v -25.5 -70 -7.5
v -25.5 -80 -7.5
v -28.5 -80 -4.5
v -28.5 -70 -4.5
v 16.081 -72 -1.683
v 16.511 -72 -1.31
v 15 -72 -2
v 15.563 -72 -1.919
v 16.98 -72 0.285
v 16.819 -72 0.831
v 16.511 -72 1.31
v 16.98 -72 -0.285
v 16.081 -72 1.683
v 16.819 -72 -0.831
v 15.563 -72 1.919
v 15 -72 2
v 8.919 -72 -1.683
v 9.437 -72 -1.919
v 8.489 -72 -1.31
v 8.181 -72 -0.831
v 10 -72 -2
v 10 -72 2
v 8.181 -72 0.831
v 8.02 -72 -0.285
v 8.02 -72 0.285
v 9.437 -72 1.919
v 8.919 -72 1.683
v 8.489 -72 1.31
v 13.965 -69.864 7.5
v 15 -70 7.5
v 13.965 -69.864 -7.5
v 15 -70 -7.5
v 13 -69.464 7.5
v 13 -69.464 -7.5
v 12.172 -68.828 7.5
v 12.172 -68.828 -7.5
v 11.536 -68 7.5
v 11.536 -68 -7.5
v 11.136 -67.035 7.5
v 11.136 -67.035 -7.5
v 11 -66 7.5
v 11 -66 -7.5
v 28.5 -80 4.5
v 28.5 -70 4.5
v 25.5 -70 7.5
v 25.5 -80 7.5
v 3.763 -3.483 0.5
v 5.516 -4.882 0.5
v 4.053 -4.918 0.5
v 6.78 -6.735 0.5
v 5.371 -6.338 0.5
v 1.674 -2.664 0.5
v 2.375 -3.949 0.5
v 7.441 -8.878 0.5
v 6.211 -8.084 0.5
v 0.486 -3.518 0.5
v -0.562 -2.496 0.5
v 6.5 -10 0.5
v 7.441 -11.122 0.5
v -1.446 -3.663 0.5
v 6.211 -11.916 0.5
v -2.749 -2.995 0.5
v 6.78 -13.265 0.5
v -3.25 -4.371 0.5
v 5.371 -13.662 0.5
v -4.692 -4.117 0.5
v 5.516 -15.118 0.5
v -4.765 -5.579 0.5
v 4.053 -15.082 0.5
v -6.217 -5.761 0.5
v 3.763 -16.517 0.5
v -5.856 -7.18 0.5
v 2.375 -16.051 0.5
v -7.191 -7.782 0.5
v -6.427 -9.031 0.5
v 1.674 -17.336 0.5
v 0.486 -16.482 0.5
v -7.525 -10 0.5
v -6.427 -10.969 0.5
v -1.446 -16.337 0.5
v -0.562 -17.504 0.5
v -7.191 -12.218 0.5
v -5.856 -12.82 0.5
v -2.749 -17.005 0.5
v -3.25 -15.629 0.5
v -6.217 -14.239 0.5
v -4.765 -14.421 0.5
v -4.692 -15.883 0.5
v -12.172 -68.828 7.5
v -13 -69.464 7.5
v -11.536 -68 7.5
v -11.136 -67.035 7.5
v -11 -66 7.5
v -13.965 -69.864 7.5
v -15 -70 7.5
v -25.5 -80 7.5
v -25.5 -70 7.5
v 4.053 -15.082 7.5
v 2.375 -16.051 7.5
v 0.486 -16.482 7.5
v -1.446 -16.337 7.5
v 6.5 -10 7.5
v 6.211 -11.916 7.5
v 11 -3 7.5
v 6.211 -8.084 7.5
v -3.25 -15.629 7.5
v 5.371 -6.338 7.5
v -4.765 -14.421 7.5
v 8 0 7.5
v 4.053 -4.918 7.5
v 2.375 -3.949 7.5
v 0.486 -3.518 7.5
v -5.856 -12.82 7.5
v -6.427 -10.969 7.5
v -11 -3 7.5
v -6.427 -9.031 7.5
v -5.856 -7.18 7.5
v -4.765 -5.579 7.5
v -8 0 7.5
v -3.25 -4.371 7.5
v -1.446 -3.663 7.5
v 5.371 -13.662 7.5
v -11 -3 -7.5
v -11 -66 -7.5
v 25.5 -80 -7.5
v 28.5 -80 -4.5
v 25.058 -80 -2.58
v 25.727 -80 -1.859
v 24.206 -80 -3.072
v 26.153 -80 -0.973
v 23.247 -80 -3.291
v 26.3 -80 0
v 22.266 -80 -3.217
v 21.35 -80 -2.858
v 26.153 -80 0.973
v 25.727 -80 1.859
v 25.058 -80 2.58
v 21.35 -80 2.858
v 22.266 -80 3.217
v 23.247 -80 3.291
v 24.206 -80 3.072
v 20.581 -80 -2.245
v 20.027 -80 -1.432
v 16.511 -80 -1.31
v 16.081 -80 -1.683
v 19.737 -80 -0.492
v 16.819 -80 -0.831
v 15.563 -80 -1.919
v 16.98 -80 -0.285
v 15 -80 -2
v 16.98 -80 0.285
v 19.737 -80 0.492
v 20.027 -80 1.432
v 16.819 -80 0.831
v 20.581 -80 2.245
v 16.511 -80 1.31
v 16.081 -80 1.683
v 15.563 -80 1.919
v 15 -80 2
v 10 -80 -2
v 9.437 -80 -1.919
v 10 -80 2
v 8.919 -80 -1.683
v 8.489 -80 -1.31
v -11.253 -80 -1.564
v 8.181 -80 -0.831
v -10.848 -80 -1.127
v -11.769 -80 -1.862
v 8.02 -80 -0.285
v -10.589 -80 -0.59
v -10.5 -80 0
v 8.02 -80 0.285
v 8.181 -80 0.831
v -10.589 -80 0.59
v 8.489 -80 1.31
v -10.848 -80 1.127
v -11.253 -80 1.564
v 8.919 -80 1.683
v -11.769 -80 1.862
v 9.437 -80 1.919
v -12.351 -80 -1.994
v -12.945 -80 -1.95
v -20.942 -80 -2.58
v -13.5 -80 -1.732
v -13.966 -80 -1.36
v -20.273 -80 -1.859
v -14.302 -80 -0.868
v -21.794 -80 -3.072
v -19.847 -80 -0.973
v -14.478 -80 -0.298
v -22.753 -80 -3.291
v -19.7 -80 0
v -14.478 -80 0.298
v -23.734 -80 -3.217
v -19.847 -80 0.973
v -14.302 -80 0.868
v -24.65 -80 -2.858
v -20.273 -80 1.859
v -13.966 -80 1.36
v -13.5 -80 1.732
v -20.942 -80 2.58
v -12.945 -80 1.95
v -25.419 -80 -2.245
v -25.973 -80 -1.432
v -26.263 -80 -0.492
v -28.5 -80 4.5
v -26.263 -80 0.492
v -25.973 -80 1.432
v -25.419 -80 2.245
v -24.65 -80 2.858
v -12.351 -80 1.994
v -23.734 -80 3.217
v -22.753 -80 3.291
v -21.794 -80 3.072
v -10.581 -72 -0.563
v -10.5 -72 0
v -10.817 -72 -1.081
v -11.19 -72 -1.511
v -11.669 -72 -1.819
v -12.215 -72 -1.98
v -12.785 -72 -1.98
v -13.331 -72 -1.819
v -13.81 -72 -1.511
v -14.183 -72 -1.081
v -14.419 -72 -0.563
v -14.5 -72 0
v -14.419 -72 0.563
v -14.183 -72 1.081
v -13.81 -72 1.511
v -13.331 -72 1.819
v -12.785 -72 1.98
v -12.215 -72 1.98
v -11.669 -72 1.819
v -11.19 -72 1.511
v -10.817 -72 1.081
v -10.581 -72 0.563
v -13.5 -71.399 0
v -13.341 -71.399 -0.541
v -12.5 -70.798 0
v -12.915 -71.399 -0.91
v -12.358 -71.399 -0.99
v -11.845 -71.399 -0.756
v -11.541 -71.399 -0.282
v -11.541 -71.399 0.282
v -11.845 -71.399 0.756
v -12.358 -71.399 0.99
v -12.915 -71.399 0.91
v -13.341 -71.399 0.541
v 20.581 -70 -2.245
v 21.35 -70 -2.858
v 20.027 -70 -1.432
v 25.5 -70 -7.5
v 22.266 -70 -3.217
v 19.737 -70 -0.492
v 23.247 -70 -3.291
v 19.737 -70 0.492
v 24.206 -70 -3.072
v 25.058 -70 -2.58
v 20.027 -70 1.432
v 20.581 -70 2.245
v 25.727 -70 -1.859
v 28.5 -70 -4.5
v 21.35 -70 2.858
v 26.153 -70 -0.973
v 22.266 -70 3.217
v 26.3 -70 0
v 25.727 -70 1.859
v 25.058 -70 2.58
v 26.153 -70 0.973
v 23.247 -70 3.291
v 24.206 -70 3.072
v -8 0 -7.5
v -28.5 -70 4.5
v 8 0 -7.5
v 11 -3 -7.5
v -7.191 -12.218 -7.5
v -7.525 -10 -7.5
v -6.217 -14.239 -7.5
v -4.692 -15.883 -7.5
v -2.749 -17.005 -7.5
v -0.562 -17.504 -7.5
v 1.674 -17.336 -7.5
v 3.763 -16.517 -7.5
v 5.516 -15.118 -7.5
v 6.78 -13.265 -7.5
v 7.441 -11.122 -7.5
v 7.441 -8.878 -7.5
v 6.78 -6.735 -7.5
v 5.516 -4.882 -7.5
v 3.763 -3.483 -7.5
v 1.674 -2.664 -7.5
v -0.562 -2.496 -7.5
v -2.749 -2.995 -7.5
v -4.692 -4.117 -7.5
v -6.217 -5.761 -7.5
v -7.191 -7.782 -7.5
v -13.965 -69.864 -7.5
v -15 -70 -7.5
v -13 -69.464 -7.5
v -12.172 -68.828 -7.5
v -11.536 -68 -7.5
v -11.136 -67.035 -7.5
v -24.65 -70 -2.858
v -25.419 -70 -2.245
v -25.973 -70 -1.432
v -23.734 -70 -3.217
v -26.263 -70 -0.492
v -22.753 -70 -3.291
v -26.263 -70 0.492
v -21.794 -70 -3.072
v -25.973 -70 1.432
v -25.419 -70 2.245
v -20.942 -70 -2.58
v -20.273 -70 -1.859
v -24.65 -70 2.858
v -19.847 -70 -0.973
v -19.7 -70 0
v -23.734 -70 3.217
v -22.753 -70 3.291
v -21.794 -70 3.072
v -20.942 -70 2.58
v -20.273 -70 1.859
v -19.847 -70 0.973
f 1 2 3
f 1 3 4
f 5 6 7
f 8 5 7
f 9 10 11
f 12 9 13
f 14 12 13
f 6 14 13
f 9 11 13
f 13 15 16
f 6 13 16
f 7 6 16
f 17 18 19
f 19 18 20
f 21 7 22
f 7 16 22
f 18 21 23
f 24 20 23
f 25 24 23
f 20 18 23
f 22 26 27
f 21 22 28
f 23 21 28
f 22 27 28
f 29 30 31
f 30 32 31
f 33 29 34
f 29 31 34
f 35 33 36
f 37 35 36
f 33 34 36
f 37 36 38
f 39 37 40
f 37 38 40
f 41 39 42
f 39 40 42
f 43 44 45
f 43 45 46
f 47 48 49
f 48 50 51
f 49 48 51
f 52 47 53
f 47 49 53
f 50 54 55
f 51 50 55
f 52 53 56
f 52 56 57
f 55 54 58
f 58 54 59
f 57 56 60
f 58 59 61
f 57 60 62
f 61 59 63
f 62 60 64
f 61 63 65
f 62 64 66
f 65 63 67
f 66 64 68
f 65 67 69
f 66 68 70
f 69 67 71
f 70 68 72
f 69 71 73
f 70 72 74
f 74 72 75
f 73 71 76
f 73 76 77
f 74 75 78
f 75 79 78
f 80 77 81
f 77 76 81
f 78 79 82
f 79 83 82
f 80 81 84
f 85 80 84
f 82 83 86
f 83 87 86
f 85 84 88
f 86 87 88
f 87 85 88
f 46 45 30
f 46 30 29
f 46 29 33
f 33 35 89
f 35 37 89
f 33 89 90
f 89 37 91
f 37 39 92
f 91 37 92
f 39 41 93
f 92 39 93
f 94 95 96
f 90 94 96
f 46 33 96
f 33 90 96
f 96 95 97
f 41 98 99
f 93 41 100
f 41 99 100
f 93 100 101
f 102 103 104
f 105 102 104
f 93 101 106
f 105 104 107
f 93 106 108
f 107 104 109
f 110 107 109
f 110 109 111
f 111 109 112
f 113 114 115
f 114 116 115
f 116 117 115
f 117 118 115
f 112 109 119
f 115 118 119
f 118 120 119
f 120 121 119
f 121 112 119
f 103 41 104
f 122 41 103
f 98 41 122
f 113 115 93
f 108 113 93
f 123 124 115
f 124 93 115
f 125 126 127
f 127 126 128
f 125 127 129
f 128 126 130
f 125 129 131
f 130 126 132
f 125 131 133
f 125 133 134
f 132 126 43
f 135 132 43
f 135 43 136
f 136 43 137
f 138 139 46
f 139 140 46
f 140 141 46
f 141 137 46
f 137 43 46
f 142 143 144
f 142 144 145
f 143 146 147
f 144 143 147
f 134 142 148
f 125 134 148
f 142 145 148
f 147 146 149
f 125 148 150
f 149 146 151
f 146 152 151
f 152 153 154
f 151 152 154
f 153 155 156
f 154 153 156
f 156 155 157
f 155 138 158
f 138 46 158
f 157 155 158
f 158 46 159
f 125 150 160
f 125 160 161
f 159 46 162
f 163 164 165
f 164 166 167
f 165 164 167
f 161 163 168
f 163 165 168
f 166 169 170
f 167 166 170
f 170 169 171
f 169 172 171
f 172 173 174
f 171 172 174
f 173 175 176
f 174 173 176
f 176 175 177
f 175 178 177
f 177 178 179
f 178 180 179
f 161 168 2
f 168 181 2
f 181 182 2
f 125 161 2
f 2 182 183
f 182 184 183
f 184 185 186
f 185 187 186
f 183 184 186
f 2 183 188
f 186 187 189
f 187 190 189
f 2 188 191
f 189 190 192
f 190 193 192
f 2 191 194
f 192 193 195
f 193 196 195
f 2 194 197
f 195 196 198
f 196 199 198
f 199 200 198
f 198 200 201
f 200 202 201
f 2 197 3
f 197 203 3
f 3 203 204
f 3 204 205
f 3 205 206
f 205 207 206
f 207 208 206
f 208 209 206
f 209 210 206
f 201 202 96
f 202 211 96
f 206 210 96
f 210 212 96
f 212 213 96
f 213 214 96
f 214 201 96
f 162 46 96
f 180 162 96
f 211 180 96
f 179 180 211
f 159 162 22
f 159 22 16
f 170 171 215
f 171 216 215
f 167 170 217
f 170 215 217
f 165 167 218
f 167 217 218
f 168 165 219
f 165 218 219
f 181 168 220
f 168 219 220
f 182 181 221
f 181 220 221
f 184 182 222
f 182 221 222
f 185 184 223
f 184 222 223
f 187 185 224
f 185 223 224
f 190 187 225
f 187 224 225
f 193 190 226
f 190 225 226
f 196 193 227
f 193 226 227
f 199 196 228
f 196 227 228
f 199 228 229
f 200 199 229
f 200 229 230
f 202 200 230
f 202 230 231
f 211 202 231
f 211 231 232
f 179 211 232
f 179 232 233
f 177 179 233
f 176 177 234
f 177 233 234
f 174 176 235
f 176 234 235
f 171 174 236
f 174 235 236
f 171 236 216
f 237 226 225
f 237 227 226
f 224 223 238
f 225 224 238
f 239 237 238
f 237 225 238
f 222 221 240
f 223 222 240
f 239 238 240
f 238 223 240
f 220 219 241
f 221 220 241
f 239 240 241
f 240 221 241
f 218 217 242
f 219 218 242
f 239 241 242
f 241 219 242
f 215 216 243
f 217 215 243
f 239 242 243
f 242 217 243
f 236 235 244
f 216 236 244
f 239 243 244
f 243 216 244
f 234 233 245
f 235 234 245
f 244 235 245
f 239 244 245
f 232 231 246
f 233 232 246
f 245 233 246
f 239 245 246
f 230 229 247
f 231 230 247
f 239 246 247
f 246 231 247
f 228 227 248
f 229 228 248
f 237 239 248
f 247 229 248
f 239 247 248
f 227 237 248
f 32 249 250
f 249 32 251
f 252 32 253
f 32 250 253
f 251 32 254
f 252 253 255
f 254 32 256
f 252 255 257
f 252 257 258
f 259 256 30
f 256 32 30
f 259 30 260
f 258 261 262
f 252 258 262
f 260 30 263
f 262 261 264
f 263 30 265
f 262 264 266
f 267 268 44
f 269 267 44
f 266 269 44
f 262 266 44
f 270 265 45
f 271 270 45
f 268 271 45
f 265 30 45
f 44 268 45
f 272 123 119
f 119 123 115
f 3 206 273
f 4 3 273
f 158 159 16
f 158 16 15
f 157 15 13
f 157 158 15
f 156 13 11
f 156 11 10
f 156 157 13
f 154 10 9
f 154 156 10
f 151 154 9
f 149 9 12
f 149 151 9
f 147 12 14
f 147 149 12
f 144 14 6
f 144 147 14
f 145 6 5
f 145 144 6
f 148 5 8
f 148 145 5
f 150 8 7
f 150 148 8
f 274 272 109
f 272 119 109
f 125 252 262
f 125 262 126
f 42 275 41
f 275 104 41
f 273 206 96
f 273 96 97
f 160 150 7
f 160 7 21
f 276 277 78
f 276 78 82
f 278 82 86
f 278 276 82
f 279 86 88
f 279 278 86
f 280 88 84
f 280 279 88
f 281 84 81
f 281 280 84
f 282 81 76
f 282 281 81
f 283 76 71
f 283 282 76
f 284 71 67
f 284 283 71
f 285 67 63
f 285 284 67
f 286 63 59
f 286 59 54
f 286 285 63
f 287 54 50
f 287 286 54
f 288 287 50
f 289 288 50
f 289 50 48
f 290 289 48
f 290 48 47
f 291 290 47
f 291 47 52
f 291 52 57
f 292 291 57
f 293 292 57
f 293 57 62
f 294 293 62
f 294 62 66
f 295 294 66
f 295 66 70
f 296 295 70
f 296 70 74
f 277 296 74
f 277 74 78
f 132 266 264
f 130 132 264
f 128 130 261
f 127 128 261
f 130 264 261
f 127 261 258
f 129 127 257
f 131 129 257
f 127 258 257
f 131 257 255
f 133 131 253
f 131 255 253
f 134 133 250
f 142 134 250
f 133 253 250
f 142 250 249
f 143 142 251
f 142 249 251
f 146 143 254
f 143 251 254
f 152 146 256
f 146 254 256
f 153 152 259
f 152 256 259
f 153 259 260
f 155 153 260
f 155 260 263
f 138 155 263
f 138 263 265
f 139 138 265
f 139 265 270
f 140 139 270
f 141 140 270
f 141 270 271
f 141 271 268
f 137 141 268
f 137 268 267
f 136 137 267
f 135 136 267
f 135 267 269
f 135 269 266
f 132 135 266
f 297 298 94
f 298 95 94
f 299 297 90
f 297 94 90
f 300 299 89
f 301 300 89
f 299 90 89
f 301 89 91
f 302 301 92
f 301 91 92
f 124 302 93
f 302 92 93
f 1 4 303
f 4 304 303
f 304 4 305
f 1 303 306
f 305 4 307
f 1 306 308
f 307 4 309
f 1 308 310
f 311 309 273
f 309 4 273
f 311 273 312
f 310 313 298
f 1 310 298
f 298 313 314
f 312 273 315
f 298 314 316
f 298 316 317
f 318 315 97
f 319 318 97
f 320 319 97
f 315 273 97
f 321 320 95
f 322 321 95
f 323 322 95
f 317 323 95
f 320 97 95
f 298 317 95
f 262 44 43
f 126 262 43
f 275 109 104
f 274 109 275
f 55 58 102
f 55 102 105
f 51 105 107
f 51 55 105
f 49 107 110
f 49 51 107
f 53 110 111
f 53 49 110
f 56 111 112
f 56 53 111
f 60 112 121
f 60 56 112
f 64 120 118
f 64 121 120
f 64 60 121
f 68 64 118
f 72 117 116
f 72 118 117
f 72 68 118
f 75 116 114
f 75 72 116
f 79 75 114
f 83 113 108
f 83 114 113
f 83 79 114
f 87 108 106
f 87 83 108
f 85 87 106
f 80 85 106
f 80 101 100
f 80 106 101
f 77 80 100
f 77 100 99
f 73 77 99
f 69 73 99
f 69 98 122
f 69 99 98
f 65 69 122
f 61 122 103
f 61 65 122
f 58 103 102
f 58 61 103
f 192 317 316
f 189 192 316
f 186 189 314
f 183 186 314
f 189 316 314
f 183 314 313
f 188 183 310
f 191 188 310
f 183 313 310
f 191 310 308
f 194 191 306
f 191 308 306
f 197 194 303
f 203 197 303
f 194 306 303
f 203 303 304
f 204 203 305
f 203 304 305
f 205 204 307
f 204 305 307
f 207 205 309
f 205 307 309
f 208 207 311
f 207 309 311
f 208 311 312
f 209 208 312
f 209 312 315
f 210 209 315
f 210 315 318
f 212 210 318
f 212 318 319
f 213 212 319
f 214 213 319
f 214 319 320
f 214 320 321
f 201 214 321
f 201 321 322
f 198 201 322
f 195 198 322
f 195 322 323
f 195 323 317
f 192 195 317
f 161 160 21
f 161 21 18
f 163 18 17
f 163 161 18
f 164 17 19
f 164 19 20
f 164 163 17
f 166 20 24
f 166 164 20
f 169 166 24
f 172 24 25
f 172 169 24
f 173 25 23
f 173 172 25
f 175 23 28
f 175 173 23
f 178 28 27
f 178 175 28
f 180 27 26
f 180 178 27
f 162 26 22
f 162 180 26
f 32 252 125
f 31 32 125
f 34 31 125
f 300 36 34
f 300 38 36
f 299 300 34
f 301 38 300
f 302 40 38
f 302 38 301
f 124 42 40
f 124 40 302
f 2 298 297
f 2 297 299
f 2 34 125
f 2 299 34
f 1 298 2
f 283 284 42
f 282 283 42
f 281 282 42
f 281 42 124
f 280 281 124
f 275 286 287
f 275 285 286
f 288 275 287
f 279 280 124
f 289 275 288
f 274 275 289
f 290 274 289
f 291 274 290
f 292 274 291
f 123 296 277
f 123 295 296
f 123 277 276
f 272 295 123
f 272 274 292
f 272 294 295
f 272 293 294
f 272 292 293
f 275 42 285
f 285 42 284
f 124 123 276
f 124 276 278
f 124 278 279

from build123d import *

# Parameters (mm, degrees)
BOSS_EXTRUDE1_DEPTH          = 7.5
FILLET1_R                    = 4
M6_CLEARANCE_HOLE1_D         = 6.6
F_4_0_4_DIAMETER_HOLE1_D     = 4
F_4_0_4_DIAMETER_HOLE1_DEPTH = 8
F_4_0_4_DIAMETER_HOLE1_TIP   = 1.201721238
CUT_EXTRUDE1_DEPTH           = 8
CHAMFER1_SIZE                = 3
CUT_EXTRUDE6_DEPTH           = 0.5
CUT_EXTRUDE6_DEPTH_BACK      = 86.255498356
SKETCH12_R                   = 7.525
CUT_EXTRUDE7_DEPTH           = 86.255498356
CUT_EXTRUDE7_DEPTH_BACK      = 86.255498356
SKETCH13_R                   = 6.5
CHAMFER3_SIZE                = 3


with BuildPart() as part:
    # Sketch1 → Boss-Extrude1 (new, symmetric)
    with BuildSketch(Plane.XY):
        Polygon((-11, 0), (11, 0), (11, -70), (28.5, -70), (28.5, -80), (-28.5, -80), (-28.5, -70), (-11, -70), align=None)
    extrude(amount=BOSS_EXTRUDE1_DEPTH, both=True)

    # Fillet1
    fillet1_edges = [part.edges().sort_by_distance(p)[0] for p in [
        (11, -70, 0),
        (-11, -70, 0),
    ]]
    fillet(fillet1_edges, radius=FILLET1_R)

    # M6 Clearance Hole1 (through all)
    with Locations(Plane(origin=(0, -80, 0), x_dir=(-1, 0, 0), z_dir=(0, -1, 0))):
        with Locations((23, 0), (-23, 0)):
            Hole(M6_CLEARANCE_HOLE1_D / 2)

    # Ø4.0 (4) Diameter Hole1
    with Locations(Plane(origin=(0, -80, 0), x_dir=(-1, 0, 0), z_dir=(0, -1, 0))):
        with Locations((12.5, 0)):
            Hole(F_4_0_4_DIAMETER_HOLE1_D / 2, depth=F_4_0_4_DIAMETER_HOLE1_DEPTH)
            with Locations((0, 0, -(F_4_0_4_DIAMETER_HOLE1_DEPTH + F_4_0_4_DIAMETER_HOLE1_TIP / 2))):  # 118° drill point
                Cone(0, F_4_0_4_DIAMETER_HOLE1_D / 2, F_4_0_4_DIAMETER_HOLE1_TIP, mode=Mode.SUBTRACT)

    # Sketch5 → Cut-Extrude1 (cut)
    with BuildSketch(Plane.XZ.offset(80)):
        with BuildLine():
            Line((10, 2), (15, 2))
            ThreePointArc((15, 2), (17, 0), (15, -2))
            Line((15, -2), (10, -2))
            ThreePointArc((10, -2), (8, 0), (10, 2))
        make_face()
    extrude(amount=-CUT_EXTRUDE1_DEPTH, mode=Mode.SUBTRACT)

    # Chamfer1
    chamfer1_edges = [part.edges().sort_by_distance(p)[0] for p in [
        (-28.5, -75, 7.5),
        (28.5, -75, 7.5),
        (28.5, -75, -7.5),
        (-28.5, -75, -7.5),
    ]]
    chamfer(chamfer1_edges, length=CHAMFER1_SIZE)

    # Sketch12 → Cut-Extrude6 (cut, two sides: drawn at the far end of the back side and taken through both)
    with BuildSketch(Plane.XY.offset(-CUT_EXTRUDE6_DEPTH_BACK)):
        with Locations(Location((0, -10, 0), (0, 0, 180))):
            Circle(SKETCH12_R)
    extrude(amount=CUT_EXTRUDE6_DEPTH + CUT_EXTRUDE6_DEPTH_BACK, mode=Mode.SUBTRACT)

    # Sketch13 → Cut-Extrude7 (cut, two sides: drawn at the far end of the back side and taken through both)
    with BuildSketch(Plane.XY.offset(-CUT_EXTRUDE7_DEPTH_BACK)):
        with Locations((0, -10)):
            Circle(SKETCH13_R)
    extrude(amount=CUT_EXTRUDE7_DEPTH + CUT_EXTRUDE7_DEPTH_BACK, mode=Mode.SUBTRACT)

    # Chamfer3
    chamfer3_edges = [part.edges().sort_by_distance(p)[0] for p in [
        (-11, 0, 0),
        (11, 0, 0),
    ]]
    chamfer(chamfer3_edges, length=CHAMFER3_SIZE)


solid = part.part
